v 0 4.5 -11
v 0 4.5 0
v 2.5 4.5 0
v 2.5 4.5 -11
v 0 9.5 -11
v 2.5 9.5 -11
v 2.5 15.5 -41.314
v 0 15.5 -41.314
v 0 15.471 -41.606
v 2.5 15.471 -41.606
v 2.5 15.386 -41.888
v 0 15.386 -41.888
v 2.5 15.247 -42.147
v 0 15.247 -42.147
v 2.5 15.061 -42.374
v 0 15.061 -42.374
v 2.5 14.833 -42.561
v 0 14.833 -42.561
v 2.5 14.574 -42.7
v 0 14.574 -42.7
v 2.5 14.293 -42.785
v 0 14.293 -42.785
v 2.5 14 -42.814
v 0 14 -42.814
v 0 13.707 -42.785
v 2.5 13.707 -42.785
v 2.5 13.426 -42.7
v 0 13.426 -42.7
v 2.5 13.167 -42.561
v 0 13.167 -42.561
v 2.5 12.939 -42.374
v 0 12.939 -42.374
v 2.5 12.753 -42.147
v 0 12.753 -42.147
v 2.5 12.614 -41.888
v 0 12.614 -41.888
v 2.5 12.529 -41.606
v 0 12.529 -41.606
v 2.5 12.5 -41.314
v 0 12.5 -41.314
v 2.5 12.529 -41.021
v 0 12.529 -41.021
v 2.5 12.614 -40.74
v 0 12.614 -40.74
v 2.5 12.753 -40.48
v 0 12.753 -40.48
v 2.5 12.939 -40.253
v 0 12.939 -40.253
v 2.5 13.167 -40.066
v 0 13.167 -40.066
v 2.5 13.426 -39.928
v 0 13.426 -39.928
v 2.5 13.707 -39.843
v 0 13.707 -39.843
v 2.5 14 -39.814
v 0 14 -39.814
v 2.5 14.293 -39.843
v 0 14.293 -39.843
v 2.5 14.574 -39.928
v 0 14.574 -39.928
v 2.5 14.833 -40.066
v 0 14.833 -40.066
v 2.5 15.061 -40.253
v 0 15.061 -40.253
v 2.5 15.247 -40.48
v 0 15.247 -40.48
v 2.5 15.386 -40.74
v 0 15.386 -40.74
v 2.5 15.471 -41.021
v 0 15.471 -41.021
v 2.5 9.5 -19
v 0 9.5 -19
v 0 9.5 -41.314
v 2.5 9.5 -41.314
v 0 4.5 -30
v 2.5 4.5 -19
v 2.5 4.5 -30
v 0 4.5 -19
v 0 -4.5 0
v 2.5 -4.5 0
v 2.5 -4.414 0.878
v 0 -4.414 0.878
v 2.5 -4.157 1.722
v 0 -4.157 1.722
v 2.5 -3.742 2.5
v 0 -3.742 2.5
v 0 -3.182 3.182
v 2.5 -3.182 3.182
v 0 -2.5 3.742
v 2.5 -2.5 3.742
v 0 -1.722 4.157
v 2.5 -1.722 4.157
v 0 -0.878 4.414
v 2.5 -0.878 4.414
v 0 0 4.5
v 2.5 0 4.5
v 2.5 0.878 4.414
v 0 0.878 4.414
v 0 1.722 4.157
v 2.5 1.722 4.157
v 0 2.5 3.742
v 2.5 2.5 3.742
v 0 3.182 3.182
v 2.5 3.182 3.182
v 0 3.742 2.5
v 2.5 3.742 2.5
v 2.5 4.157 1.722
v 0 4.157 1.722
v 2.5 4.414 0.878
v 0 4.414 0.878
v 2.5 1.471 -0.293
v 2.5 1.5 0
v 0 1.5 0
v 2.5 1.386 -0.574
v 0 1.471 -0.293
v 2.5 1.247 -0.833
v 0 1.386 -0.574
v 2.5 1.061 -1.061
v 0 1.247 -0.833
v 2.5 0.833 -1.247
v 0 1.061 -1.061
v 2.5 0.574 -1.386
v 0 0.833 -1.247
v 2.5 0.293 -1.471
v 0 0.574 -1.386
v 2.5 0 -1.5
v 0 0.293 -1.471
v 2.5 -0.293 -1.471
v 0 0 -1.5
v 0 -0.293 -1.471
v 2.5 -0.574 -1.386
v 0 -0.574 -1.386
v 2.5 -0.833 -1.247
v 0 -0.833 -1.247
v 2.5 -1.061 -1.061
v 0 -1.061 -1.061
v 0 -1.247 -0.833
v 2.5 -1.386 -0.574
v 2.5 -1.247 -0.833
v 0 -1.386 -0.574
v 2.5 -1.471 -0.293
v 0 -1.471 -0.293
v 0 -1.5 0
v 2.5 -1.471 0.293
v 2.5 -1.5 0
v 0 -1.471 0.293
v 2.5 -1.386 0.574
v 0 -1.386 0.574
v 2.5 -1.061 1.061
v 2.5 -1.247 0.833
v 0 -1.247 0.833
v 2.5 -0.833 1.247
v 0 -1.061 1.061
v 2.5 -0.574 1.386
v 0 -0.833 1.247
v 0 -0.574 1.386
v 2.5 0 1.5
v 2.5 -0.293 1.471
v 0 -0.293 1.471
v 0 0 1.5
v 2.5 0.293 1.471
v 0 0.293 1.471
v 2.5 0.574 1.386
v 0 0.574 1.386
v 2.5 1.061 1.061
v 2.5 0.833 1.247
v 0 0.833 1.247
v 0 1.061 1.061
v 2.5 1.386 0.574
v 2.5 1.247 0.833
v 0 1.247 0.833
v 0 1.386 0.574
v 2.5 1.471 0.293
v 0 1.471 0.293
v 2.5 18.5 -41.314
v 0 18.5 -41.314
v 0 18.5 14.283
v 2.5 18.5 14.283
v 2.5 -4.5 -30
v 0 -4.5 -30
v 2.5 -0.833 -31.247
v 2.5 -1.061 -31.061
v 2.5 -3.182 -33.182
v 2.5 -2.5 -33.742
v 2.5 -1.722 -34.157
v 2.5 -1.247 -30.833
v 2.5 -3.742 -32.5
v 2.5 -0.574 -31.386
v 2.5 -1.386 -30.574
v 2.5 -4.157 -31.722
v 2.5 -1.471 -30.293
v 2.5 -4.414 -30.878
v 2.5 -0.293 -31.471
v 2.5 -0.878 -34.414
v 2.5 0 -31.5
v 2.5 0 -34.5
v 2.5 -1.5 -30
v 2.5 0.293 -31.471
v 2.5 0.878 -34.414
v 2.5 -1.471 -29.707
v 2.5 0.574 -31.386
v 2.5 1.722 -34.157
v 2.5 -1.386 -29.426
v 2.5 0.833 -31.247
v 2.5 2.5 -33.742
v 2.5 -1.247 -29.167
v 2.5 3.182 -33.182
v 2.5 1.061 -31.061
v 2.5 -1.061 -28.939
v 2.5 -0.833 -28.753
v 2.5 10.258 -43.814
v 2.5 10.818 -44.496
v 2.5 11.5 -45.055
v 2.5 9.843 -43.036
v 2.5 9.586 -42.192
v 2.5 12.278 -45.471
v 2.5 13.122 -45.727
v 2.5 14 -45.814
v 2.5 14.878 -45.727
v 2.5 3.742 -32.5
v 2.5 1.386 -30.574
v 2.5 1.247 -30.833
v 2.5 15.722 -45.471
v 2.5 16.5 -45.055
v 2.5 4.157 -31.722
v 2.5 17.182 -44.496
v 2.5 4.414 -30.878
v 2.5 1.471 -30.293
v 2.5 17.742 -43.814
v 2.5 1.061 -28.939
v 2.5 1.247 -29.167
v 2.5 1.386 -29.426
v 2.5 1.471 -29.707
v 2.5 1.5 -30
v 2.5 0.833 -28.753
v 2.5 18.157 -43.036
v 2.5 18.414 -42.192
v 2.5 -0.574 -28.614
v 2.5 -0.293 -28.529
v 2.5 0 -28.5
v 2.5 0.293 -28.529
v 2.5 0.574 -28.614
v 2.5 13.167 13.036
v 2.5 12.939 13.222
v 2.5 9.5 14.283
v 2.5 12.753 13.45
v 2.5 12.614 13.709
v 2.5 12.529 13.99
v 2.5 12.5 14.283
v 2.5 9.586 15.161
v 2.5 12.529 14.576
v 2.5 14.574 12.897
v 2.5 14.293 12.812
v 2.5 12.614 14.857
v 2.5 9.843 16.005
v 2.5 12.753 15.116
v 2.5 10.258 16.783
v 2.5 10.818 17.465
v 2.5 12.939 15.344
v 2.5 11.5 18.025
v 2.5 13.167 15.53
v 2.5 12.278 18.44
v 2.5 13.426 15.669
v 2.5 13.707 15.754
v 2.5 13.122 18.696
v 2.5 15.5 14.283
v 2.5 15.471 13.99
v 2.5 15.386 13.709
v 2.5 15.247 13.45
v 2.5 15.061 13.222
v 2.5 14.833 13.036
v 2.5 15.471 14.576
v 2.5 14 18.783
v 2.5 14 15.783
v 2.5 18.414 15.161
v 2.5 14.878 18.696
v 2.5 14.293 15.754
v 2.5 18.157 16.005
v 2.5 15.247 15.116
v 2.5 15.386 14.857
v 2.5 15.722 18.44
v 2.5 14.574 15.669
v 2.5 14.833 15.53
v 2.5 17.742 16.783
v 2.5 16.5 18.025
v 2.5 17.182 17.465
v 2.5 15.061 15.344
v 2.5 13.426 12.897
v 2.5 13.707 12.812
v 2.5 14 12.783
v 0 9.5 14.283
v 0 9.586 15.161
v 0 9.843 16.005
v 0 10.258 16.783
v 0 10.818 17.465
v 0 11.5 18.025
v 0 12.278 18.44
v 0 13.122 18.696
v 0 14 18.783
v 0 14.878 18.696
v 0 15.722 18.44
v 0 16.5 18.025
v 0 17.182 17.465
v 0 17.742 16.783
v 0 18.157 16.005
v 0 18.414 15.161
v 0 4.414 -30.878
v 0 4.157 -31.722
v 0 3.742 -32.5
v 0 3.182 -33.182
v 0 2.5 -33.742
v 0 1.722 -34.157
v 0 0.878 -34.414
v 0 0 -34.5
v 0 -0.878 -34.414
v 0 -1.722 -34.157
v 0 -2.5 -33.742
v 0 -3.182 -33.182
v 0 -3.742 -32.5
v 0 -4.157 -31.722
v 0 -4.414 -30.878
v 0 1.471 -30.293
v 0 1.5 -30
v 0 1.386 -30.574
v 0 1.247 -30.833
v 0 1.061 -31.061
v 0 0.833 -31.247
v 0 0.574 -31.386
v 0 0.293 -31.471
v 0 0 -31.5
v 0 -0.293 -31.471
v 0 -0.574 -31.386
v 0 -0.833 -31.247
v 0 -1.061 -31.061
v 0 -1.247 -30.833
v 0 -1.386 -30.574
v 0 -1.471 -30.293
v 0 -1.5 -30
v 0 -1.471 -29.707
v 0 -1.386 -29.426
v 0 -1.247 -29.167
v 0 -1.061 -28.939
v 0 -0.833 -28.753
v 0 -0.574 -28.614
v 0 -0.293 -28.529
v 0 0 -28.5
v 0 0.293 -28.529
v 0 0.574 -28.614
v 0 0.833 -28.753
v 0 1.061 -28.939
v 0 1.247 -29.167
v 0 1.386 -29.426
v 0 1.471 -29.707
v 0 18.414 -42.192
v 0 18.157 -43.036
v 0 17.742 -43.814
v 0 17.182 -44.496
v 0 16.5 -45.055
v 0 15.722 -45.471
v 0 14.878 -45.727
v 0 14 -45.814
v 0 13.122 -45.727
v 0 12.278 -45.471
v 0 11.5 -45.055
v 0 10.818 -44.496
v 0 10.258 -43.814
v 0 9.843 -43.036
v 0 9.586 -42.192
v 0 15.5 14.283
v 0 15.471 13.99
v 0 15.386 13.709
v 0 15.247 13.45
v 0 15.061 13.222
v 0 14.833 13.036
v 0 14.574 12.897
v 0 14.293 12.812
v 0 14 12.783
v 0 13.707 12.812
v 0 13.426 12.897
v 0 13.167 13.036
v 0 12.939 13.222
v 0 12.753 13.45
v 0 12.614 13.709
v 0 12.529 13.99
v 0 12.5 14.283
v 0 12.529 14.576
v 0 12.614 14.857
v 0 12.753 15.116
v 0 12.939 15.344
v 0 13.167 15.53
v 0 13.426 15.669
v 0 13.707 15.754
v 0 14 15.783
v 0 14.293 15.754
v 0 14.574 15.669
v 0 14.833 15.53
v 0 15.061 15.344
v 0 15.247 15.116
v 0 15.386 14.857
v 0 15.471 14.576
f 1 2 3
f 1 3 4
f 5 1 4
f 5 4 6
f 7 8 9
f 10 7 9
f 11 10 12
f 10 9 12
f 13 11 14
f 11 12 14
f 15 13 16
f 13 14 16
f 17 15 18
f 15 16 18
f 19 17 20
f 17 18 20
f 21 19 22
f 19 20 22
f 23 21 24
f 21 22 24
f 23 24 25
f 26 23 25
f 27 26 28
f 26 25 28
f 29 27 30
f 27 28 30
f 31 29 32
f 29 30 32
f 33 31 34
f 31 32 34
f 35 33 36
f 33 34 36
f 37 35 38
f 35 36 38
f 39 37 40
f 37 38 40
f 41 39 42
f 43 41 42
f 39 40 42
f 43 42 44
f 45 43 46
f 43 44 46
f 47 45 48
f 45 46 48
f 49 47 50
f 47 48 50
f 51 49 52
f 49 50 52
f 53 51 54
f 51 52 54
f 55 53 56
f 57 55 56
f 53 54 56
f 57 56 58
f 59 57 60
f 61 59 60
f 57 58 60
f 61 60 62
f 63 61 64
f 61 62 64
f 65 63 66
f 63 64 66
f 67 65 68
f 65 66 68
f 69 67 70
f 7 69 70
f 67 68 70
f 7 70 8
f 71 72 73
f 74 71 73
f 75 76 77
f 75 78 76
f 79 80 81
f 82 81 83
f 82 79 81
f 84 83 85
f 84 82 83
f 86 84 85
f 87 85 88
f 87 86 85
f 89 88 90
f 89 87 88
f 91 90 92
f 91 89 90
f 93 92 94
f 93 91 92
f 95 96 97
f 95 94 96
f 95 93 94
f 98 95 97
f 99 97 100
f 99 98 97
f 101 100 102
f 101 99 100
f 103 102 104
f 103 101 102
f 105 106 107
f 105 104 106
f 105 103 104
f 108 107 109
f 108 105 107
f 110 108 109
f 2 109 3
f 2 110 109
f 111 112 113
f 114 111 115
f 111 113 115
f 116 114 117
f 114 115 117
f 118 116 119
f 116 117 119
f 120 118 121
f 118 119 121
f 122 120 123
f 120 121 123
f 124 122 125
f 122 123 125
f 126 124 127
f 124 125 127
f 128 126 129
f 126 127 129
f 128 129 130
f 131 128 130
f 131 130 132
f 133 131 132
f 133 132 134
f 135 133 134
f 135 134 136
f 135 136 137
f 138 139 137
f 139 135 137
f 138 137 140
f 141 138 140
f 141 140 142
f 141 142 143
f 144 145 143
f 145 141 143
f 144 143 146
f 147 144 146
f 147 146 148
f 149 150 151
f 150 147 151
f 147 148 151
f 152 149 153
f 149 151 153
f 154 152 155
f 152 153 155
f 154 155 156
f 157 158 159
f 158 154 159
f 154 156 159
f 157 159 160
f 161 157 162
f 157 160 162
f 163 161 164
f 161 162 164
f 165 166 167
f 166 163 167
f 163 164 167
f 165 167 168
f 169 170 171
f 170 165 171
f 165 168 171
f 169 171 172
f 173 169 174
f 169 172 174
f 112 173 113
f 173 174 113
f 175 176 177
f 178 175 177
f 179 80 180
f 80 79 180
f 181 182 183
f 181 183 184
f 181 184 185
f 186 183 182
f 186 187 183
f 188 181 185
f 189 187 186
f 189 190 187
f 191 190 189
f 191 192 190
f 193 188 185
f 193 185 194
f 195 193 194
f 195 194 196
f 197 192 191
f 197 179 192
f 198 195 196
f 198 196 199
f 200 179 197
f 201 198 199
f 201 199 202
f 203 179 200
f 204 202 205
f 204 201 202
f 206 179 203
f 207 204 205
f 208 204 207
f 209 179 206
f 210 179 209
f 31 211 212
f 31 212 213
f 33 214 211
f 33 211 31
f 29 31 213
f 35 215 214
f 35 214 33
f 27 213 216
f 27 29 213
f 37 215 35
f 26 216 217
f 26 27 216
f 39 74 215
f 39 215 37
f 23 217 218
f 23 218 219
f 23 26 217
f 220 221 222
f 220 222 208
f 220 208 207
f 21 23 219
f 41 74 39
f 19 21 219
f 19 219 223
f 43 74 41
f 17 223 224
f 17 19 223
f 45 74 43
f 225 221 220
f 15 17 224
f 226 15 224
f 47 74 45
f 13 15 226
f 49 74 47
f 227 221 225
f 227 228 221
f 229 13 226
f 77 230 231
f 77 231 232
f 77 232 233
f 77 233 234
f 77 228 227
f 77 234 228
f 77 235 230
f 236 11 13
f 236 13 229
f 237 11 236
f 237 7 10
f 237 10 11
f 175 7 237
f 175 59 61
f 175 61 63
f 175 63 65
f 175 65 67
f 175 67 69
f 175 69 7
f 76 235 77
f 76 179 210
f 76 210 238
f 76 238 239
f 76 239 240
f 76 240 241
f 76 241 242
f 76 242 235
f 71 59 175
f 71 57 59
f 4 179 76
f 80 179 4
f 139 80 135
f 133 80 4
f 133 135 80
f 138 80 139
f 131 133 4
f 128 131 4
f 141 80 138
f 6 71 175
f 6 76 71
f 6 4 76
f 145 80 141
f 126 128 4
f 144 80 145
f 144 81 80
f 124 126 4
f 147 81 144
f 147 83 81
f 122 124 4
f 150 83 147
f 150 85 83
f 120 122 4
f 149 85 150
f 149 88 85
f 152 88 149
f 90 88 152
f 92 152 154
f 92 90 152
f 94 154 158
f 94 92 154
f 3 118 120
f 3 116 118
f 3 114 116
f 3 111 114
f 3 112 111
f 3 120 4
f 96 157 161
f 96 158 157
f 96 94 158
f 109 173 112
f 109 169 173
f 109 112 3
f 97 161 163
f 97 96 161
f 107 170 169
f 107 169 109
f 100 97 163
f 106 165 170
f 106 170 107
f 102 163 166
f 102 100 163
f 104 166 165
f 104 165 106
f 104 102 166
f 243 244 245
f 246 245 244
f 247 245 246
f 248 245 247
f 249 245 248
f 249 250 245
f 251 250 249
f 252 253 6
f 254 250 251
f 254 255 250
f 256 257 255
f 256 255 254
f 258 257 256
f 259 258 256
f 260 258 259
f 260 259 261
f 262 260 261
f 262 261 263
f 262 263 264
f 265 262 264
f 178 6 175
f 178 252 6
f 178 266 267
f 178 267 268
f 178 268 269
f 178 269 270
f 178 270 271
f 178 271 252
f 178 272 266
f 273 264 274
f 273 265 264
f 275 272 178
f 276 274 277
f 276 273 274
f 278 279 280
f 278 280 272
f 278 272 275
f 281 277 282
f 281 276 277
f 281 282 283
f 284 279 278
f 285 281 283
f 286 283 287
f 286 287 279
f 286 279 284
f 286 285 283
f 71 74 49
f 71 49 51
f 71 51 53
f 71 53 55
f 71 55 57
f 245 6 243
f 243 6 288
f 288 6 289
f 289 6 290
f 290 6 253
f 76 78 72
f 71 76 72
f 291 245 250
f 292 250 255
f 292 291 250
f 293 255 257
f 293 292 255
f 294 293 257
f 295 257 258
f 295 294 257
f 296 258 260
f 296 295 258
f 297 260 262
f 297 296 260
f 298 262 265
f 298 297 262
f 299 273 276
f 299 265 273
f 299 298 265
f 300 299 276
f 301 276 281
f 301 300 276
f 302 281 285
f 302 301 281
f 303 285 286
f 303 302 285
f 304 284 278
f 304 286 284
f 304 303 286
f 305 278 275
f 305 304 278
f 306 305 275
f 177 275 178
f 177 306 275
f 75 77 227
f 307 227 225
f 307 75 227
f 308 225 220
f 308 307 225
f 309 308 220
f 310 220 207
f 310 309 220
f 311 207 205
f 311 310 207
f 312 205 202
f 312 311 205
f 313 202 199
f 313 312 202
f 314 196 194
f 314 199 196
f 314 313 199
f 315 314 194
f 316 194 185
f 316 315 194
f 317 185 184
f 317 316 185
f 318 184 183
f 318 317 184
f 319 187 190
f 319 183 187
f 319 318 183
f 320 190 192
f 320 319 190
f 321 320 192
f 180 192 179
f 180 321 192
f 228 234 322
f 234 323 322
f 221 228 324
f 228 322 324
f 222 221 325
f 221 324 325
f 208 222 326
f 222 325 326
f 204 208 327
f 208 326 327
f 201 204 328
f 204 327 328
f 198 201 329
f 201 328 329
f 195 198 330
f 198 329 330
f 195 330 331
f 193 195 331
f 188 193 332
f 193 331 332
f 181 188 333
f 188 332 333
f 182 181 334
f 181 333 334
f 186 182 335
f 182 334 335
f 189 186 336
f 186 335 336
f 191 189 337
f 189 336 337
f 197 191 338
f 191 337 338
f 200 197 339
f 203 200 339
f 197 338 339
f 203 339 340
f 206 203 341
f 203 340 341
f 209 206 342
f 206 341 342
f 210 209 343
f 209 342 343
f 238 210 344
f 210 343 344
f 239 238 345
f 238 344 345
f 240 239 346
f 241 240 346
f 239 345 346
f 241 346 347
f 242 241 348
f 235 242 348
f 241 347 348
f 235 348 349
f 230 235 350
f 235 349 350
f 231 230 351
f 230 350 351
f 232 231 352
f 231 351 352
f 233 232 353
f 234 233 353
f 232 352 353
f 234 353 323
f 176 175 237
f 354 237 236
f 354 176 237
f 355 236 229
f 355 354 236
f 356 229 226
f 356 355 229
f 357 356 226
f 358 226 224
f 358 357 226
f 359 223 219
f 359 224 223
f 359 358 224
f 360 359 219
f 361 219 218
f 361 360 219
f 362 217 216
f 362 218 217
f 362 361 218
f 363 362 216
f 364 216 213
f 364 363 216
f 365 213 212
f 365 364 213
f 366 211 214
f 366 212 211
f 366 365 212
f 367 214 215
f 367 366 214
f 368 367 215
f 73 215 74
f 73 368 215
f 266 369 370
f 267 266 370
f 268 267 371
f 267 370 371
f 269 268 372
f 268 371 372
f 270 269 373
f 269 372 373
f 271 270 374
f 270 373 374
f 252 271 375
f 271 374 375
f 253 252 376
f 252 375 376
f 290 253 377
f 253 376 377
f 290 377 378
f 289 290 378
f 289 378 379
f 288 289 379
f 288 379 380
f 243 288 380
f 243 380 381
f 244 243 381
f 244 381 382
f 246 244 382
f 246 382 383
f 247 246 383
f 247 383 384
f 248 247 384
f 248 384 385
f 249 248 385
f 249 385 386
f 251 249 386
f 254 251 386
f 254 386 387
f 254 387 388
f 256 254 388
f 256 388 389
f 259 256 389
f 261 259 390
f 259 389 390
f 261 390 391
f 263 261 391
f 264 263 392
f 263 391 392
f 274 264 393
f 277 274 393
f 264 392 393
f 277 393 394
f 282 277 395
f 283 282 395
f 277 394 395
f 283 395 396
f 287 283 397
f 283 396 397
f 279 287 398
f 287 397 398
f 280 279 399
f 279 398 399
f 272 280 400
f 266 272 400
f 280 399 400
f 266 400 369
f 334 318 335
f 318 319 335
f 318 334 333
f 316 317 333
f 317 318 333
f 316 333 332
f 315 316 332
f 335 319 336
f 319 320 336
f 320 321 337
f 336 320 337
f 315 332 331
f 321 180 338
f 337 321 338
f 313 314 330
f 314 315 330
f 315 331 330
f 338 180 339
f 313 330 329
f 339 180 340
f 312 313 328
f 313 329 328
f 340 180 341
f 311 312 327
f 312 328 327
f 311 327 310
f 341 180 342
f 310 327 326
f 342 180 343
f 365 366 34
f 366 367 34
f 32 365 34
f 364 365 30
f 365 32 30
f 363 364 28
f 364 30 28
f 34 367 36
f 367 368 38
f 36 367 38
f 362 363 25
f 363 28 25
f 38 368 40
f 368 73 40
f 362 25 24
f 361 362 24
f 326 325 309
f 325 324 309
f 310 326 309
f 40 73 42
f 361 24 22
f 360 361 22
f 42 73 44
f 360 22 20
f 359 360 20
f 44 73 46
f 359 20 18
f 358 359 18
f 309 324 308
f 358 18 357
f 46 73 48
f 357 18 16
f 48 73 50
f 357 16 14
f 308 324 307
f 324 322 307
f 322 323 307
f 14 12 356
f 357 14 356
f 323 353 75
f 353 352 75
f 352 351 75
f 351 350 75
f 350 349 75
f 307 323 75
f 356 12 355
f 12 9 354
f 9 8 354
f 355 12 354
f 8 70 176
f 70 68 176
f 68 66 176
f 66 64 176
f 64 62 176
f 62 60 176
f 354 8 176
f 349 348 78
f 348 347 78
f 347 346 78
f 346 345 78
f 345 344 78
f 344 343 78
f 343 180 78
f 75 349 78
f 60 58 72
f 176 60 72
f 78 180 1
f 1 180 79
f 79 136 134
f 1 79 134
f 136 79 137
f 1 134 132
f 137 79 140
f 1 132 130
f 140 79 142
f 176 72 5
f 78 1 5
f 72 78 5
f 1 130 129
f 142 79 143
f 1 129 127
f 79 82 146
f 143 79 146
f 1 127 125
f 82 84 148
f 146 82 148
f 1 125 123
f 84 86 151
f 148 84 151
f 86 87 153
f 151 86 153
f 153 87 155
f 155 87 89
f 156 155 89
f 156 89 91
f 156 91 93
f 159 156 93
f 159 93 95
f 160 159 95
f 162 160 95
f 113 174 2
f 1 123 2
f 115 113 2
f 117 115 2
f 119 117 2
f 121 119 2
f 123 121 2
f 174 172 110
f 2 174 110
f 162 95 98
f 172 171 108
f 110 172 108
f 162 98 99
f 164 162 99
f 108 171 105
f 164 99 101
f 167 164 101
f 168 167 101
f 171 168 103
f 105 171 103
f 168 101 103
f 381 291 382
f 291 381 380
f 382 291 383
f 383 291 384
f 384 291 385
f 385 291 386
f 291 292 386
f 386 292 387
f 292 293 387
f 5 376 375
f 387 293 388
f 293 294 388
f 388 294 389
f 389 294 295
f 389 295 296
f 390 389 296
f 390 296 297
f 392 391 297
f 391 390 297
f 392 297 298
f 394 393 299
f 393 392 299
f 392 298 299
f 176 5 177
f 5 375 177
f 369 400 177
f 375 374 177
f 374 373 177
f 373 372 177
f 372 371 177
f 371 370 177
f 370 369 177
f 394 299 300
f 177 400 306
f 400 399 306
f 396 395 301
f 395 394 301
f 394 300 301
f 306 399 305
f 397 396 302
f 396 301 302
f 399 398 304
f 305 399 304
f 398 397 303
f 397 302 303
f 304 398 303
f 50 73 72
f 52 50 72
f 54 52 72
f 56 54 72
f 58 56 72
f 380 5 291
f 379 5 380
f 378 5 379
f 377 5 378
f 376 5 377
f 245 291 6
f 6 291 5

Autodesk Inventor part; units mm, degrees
ref_plane "YZ Plane" through (0, 0, 0) normal (1, 0, 0) x (0, 1, 0)
ref_plane "XZ Plane" through (0, 0, 0) normal (0, 1, 0) x (-1, 0, 0)
ref_plane "XY Plane" through (0, 0, 0) normal (0, 0, 1) x (1, 0, 0)
sketch "Sketch1" plane through (0, 0, 0) normal (1, 0, 0) x (0, 1, 0)
  circle A0 centre (0, 0) radius 1.5
  line L0 (0, 0) -> (0, -30)
  circle A1 centre (0, -30) radius 1.5
  arc A2 (-4.5, -30) -> (0, -25.5) centre (0, -30) ccw
  arc A3 (4.5, 0) -> (0, -4.5) centre (0, 0) ccw
  line L1 (4.5, 0) -> (4.5, -30)
  line L2 (-4.5, 0) -> (-4.5, -30)
  line L3 (4.5, 0) -> (4.5, -15)
  line L4 (4.5, -15) -> (4.5, -19)
  line L5 (4.5, -15) -> (4.5, -11)
  line L6 (4.5, -11) -> (9.5, -11)
  line L7 (4.5, -19) -> (9.5, -19)
  line L8 (9.5, -11) -> (9.5, -19)
  line L9 (9.5, -19) -> (9.5, -15)
  line L10 (9.5, -15) -> (14, -15)
  line L11 (14, -15) -> (14, -65)
  line L12 (0, 0) -> (14, 14.2829)
  circle A4 centre (14, 14.2829) radius 1.5
  circle A5 centre (14, 14.2829) radius 4.5
  line L13 (14, -15) -> (14, 15.7829)
  line L14 (14, 18.7829) -> (14, 35)
  line L15 (9.5, 14.2829) -> (9.5, -11)
  line L16 (0, -30) -> (14, -41.3137)
  circle A6 centre (14, -41.3137) radius 1.5
  circle A7 centre (14, -41.3137) radius 4.5
  line L17 (9.5, -19) -> (9.5, -41.3137)
  line L18 (18.5, -41.3137) -> (18.5, 14.2829)
  dimension "d15" = 3
  dimension "d0" = 3
  dimension "d1" = 30
  dimension "d2" = 3
  dimension "d3" = 9
  dimension "d4" = 9
  dimension "d5" = 15
  dimension "d6" = 4
  dimension "d7" = 4
  dimension "d8" = 5
  dimension "d9" = 5
  dimension "d10" = 4
  dimension "d11" = 4.5
  dimension "d12" = 50
  dimension "d13" = 50
  dimension "d14" = 20
  dimension "d16" = 9
  dimension "d17" = 18
  dimension "d18" = 3
  dimension "d19" = 9
extrude "Extrusion1" add sketch "Sketch1" along normal blind 2.5 contours A0 L12 A3 L1 A2 L0 | A0 L0 A3 L12 | L0 A1 L16 A2 L2 A3 | L15 A5 L12 | L12 A5 L13 L10 L8 L15 | A2 L16 A1 L0 | L6 L8 L7 L1 | A5 L13 A4 L12 | L12 A4 L13 A5 | A5 L18 A7 L11 L13 | L10 L11 A7 L16 L17 L8 | L16 A7 L17 | A7 L11 A6 L16 | L16 A6 L11 A7 | A7 L11 A6
properties part number "acople_acr"
